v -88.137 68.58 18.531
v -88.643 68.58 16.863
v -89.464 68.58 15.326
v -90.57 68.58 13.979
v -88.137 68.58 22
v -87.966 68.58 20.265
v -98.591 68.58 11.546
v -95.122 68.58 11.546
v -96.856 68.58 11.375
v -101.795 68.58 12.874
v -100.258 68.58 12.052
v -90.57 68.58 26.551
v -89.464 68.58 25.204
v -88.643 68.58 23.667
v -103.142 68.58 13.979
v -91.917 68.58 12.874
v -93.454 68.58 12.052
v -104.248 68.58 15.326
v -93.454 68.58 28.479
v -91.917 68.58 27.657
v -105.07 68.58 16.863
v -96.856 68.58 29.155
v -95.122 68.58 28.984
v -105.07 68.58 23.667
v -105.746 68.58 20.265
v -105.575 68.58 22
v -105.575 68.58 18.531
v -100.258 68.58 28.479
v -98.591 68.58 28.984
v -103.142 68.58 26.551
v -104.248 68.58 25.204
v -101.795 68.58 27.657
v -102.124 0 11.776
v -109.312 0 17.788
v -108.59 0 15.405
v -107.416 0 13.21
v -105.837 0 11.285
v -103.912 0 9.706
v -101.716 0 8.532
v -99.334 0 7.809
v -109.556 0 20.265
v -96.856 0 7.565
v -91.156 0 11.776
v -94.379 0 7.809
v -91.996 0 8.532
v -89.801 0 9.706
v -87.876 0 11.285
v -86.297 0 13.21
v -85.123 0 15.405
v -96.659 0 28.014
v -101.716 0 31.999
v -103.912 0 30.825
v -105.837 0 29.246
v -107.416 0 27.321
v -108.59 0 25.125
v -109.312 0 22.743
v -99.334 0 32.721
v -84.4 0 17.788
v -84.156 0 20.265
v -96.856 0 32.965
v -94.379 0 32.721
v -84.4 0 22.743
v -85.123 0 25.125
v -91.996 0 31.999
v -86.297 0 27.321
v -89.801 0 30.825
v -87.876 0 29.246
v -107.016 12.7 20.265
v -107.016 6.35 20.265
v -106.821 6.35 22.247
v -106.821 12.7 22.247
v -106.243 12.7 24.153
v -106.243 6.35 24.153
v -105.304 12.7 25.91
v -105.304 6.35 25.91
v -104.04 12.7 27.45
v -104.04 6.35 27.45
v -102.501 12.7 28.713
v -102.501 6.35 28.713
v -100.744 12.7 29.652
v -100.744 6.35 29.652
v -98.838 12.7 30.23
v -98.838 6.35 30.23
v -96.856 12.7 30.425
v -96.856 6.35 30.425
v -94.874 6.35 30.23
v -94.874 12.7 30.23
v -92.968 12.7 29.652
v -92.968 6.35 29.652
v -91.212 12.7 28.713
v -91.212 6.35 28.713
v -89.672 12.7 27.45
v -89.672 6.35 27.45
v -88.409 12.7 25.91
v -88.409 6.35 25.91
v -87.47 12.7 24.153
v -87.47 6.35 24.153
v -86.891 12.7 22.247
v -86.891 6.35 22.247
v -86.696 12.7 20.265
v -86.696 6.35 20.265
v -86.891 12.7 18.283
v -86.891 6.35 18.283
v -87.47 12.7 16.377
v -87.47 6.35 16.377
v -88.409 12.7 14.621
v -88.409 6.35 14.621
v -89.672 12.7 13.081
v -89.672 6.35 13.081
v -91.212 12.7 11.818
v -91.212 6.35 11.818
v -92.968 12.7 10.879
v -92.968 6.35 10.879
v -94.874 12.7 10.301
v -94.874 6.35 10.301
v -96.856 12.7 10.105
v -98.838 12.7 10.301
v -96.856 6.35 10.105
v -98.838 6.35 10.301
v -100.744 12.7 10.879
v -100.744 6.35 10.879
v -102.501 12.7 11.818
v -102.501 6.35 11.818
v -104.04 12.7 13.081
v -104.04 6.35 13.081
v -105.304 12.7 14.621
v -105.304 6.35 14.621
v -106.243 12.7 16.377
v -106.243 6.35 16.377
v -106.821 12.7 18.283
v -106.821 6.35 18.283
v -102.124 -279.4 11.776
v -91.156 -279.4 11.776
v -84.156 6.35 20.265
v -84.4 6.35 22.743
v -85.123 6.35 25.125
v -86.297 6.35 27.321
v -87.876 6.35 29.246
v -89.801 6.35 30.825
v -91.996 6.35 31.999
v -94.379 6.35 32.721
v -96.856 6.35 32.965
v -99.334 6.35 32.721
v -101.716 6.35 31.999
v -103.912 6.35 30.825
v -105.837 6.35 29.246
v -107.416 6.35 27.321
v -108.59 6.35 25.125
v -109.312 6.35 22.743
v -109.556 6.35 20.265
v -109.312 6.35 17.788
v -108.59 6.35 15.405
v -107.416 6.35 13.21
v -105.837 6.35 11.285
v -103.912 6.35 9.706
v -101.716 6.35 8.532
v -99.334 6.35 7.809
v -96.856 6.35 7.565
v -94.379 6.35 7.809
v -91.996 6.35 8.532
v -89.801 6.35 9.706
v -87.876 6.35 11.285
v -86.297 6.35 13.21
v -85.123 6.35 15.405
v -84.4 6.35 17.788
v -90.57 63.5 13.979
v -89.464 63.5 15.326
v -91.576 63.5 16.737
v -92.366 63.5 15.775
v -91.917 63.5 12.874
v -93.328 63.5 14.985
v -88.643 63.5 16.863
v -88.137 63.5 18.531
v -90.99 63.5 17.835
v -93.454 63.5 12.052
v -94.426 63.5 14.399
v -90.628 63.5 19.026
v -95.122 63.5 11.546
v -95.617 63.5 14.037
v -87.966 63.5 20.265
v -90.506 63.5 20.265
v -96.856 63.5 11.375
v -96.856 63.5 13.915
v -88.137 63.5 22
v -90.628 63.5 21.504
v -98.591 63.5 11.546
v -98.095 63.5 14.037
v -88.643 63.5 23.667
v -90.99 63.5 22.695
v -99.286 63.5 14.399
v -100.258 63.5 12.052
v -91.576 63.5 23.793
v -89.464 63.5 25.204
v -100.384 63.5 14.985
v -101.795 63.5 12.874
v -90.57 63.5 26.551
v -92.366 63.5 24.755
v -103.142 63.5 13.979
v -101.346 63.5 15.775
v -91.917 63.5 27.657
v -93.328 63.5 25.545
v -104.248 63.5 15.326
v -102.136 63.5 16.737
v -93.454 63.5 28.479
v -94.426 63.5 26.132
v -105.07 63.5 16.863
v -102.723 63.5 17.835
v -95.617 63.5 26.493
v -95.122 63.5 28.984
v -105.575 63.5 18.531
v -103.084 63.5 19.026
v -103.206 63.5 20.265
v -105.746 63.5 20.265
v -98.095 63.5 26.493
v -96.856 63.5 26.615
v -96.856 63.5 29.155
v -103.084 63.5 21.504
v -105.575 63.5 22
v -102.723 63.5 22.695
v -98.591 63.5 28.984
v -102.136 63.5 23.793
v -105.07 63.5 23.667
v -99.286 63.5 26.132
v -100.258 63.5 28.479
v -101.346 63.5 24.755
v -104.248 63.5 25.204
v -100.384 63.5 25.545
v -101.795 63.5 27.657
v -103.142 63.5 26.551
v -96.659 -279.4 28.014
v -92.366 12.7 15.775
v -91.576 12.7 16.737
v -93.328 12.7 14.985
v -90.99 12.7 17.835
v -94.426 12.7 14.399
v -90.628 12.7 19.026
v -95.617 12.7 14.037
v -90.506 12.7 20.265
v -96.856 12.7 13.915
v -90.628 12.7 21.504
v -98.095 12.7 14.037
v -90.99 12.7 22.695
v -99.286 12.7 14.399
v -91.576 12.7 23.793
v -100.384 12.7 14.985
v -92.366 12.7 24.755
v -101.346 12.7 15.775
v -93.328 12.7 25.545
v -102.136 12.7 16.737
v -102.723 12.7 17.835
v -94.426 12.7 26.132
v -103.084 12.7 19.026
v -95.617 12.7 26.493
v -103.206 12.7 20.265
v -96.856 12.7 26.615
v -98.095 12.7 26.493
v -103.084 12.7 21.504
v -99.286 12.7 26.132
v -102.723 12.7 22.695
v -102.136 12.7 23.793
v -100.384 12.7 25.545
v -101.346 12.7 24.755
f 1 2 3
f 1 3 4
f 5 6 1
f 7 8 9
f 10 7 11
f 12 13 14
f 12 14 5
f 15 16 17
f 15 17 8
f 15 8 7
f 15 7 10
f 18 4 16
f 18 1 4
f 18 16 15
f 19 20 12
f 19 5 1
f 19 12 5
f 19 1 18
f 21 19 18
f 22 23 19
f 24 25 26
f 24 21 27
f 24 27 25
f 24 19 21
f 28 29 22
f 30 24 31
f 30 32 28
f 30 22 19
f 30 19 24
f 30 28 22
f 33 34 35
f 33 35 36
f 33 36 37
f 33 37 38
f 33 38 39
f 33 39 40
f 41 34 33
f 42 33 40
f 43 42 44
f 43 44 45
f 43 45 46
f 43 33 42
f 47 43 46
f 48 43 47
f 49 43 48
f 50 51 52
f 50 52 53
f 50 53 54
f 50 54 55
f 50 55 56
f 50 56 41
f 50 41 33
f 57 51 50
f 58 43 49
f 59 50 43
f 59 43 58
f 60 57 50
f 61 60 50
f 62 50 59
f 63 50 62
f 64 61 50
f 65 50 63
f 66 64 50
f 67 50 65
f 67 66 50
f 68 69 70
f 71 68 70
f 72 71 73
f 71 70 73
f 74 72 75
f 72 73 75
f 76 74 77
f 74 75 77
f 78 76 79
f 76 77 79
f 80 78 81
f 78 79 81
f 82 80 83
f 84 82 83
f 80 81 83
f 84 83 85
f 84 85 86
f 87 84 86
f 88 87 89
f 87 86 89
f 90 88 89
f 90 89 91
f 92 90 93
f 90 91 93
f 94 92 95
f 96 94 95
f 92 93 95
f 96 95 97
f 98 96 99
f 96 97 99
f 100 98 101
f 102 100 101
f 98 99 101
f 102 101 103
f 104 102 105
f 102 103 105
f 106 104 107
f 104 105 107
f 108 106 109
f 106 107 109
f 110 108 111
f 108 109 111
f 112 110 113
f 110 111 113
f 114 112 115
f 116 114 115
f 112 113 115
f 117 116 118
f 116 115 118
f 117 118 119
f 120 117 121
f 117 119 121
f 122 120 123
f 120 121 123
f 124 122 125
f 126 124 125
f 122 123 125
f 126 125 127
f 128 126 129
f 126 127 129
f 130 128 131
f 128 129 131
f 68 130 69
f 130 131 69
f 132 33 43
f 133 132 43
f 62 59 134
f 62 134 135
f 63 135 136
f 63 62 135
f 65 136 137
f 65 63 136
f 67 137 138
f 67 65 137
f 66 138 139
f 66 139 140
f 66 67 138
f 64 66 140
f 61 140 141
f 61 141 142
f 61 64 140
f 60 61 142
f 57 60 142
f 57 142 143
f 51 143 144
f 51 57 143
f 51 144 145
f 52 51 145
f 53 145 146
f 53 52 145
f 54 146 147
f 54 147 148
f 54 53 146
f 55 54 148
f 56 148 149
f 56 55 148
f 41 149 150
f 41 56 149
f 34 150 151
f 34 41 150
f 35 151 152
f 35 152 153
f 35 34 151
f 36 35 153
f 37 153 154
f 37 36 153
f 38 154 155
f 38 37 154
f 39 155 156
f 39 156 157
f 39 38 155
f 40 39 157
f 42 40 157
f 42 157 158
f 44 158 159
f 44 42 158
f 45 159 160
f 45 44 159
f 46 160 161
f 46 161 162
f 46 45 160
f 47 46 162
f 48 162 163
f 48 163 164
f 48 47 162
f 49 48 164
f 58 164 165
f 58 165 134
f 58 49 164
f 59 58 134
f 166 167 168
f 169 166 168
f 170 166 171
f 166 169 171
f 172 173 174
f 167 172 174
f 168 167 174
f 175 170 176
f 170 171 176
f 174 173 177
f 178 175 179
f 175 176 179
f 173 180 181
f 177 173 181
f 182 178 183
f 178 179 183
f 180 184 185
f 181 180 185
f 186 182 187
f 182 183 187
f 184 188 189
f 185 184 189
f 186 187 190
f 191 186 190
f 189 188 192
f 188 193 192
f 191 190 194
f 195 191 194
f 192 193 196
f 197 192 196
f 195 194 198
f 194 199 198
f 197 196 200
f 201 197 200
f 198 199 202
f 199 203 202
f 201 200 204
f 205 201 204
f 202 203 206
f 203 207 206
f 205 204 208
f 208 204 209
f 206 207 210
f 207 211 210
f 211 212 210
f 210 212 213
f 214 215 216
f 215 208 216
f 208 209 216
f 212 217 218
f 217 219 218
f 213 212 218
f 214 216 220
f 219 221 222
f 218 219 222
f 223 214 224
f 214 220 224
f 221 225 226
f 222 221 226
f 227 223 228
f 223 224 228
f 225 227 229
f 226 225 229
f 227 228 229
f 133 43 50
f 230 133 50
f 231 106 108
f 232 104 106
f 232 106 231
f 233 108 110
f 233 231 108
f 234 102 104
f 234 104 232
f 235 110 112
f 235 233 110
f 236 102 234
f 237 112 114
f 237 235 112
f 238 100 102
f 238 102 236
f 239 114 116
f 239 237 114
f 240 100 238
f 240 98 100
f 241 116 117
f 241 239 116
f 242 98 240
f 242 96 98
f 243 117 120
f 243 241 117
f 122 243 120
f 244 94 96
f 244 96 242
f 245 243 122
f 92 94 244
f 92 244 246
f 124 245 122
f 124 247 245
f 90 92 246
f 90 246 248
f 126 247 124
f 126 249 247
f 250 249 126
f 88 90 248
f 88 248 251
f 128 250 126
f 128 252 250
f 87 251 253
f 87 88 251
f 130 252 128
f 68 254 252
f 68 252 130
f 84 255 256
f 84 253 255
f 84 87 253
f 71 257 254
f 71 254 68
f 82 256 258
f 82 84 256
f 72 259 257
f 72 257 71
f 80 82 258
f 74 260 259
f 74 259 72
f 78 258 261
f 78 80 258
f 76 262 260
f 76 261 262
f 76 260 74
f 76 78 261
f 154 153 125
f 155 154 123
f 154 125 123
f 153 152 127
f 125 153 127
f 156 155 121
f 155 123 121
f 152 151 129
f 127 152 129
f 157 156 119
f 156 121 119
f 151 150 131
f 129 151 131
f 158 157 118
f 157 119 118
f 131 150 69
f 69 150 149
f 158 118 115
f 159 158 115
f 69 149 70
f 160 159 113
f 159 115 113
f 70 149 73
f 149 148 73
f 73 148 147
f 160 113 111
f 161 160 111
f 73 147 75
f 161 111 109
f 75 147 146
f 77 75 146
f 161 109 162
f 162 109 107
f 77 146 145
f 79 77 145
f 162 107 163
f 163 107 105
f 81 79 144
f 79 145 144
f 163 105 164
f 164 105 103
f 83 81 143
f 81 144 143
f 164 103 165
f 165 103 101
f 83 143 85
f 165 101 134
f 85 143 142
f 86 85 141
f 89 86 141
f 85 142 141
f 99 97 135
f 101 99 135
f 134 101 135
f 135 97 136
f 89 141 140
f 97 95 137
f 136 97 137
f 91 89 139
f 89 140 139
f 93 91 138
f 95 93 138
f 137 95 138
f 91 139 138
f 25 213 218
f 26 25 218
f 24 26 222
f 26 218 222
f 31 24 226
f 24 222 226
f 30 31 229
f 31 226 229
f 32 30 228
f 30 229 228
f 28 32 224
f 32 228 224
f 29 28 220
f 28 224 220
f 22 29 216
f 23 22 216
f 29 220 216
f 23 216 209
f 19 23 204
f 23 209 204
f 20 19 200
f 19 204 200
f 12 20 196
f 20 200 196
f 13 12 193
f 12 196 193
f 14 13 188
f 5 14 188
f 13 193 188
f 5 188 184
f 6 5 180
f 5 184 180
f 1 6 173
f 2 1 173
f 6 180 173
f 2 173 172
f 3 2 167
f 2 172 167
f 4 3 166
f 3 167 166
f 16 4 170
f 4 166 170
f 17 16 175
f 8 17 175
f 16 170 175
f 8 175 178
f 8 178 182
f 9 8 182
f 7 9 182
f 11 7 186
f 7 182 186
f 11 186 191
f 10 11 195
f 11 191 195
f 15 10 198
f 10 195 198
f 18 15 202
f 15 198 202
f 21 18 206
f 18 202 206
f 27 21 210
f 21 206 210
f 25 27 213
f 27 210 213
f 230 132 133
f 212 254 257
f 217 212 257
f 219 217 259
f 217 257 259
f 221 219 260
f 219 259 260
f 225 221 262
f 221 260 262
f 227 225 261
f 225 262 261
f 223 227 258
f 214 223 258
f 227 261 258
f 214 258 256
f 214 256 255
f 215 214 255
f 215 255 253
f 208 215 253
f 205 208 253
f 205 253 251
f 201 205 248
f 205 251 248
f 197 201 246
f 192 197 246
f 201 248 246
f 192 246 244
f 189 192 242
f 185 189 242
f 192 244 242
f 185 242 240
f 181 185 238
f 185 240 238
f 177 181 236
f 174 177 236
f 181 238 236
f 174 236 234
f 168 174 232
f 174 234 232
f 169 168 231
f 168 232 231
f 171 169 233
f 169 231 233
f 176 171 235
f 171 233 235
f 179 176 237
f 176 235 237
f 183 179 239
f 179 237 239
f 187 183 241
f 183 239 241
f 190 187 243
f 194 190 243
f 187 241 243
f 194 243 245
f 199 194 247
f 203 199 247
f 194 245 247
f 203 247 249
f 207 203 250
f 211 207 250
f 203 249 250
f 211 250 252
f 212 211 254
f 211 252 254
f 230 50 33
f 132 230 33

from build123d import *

# Parameters (mm, degrees)
F0_R     = 12.7
F1_DEPTH = 6.35
F2_R     = 10.16
F3_DEPTH = 6.35
F4_R     = 6.35
F5_DEPTH = 50.8
F6_R     = 8.89
F7_DEPTH = 5.08
F9_DEPTH = 279.4


with BuildPart() as f1:
    # F0 (on Front) → F1 (new body)
    with BuildSketch(Plane.XZ):
        with Locations((-96.856251, 20.265313)):
            Circle(F0_R)
    extrude(amount=-F1_DEPTH)

    # F2 (on face) → F3 (join)
    with BuildSketch(Plane(origin=(0, 6.35, 0), x_dir=(-1, 0, 0), z_dir=(0, 1, 0))):
        with Locations((96.856251, 20.265313)):
            Circle(F2_R)
    extrude(amount=F3_DEPTH)

    # F4 (on face) → F5 (join)
    with BuildSketch(Plane(origin=(0, 12.7, 0), x_dir=(-1, 0, 0), z_dir=(0, 1, 0))):
        with Locations((96.856251, 20.265313)):
            Circle(F4_R)
    extrude(amount=F5_DEPTH)

    # F6 (on face) → F7 (join)
    with BuildSketch(Plane(origin=(0, 63.5, 0), x_dir=(-1, 0, 0), z_dir=(0, 1, 0))):
        with Locations((96.856251, 20.265313)):
            Circle(F6_R)
    extrude(amount=F7_DEPTH)

    # F8 (on face) → F9 (join)
    with BuildSketch(Plane.XZ):
        Polygon((-96.659377, 28.0142), (-102.123946, 11.775506), (-91.156051, 11.775506), align=None)
    extrude(amount=F9_DEPTH)


solid = f1.part
